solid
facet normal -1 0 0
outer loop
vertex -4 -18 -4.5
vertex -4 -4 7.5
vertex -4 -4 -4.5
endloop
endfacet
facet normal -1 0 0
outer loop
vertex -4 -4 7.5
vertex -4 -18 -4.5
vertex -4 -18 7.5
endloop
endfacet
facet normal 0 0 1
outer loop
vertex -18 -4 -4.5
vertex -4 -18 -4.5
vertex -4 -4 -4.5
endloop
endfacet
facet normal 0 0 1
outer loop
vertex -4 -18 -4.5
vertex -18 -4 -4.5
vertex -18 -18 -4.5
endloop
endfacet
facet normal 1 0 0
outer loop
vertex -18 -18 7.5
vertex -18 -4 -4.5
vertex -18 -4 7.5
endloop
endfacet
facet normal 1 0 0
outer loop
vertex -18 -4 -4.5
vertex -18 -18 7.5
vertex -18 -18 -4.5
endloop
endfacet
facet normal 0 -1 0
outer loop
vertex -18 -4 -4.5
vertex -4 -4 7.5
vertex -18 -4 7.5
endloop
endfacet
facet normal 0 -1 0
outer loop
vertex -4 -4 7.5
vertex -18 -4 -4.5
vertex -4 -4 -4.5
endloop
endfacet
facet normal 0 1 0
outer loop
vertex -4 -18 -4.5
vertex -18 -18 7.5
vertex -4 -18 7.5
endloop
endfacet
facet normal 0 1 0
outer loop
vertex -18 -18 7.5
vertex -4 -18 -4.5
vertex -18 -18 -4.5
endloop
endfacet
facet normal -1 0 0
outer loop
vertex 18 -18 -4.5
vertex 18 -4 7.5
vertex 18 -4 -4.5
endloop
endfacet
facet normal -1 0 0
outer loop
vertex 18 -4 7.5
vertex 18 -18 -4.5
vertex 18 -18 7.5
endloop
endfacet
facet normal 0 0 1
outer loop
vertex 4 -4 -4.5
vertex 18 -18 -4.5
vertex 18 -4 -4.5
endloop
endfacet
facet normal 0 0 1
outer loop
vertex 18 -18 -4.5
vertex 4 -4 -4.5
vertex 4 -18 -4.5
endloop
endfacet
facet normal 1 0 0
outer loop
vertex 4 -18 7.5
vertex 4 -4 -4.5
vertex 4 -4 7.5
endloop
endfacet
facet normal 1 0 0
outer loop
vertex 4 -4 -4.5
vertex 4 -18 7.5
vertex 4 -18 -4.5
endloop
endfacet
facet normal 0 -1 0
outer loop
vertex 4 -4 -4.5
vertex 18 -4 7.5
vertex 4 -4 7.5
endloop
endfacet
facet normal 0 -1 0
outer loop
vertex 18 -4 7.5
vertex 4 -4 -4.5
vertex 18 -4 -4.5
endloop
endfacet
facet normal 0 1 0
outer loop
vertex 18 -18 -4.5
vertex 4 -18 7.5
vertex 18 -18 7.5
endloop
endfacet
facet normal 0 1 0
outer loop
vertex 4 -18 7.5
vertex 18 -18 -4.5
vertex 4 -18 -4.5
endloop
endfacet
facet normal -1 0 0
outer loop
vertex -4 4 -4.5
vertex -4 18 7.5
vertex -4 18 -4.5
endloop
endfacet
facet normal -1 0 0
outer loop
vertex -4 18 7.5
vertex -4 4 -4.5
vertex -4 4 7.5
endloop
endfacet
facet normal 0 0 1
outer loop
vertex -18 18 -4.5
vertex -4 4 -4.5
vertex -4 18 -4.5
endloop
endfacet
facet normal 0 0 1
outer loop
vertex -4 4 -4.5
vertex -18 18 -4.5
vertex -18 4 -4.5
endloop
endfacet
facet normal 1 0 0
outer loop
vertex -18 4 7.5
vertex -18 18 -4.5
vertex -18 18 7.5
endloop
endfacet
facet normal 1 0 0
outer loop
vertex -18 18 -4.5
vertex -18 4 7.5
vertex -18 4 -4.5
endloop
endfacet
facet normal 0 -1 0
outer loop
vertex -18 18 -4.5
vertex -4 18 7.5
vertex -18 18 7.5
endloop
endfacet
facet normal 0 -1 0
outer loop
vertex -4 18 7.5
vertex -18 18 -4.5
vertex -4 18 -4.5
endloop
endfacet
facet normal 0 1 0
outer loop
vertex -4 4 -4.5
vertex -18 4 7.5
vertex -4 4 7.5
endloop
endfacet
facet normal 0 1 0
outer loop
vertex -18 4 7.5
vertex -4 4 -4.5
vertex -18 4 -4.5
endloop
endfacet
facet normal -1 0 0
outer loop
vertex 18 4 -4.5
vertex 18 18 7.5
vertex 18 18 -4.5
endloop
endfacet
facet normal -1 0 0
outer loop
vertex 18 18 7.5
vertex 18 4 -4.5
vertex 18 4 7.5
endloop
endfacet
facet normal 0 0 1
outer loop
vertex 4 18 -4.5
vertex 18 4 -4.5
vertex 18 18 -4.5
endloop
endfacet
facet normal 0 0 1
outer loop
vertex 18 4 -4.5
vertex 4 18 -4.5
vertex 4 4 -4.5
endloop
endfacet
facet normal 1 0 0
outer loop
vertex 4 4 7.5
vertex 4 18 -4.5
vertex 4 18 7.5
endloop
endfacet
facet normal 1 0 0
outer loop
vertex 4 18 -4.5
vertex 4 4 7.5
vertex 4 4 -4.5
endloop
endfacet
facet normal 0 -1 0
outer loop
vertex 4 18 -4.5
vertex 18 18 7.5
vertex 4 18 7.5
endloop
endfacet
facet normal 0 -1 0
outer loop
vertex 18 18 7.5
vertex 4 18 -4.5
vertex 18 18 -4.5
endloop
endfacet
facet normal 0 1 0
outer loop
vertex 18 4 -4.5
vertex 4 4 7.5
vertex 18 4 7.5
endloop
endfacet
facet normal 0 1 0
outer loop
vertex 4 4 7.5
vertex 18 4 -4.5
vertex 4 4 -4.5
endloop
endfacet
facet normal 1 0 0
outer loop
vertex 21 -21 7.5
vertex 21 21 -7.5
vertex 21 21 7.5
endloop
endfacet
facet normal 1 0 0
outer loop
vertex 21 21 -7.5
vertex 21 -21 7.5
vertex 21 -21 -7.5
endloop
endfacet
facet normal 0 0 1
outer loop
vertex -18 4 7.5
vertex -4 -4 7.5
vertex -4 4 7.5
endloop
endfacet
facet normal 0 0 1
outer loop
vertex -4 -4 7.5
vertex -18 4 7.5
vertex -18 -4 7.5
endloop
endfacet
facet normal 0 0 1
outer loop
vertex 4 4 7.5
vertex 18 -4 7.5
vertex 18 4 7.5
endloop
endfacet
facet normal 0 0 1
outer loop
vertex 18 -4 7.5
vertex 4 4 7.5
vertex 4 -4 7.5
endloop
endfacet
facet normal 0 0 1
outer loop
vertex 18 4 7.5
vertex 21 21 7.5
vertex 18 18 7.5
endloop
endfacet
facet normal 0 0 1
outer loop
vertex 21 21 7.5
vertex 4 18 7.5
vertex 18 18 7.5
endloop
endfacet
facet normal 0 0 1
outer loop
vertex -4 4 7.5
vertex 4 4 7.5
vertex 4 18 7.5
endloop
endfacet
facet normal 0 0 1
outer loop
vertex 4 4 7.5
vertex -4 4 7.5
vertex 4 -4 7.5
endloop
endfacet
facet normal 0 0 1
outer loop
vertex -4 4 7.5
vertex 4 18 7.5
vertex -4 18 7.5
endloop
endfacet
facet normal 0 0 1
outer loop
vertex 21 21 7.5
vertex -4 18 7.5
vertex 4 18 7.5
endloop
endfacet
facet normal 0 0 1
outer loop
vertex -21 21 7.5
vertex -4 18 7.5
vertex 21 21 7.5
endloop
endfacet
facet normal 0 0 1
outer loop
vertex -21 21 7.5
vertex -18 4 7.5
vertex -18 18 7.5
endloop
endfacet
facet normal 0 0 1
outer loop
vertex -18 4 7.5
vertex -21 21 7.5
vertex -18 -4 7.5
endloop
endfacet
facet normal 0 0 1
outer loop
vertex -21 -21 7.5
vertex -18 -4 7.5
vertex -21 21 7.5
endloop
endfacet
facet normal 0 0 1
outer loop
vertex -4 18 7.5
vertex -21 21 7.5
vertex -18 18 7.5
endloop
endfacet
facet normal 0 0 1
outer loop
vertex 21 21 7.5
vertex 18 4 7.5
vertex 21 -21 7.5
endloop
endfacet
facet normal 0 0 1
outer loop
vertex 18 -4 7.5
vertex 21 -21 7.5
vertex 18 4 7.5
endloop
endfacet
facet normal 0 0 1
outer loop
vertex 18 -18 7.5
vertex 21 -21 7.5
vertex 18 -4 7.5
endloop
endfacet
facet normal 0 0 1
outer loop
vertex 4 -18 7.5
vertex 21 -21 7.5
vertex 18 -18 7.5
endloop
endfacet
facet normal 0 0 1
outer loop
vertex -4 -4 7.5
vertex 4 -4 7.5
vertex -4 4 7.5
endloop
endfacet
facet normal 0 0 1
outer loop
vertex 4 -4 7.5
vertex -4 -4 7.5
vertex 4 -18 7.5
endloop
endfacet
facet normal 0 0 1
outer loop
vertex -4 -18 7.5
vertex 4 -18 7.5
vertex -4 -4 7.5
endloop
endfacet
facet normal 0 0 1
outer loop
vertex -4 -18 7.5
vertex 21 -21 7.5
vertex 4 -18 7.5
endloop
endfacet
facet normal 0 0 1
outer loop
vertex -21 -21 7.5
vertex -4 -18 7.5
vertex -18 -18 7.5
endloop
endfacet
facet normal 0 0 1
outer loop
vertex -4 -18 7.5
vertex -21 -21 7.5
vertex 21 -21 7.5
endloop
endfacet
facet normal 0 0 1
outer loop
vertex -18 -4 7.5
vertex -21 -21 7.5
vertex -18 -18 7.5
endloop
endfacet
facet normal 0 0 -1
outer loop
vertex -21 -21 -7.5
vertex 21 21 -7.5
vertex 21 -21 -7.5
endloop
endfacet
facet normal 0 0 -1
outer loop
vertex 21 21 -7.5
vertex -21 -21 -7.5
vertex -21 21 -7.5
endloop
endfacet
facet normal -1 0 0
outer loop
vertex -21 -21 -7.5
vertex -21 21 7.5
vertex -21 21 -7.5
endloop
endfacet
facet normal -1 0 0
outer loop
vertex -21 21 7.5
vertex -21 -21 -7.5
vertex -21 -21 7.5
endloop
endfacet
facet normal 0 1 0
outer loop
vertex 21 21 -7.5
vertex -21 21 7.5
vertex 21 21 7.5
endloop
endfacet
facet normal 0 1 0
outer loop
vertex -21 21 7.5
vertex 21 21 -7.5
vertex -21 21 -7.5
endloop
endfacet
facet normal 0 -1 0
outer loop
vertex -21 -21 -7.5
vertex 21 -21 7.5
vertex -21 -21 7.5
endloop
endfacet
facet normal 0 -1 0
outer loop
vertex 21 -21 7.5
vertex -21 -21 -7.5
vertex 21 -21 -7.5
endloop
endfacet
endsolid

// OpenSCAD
$fn = 32;

// ----------------------------------------------------------------------
// Pocket plate 42 x 42 x 15
// 2 x 2 pockets 14 mm square, 12 mm deep
// ----------------------------------------------------------------------

// --- parameters (mm) ---
thickness = 15;  // plate thickness
floor_t = 3;     // material left under each pocket
pocket = 14;     // pocket side length
pitch_x = 22;    // pocket pitch along X
pitch_y = 22;    // pocket pitch along Y
cols = 2;        // pockets per row
rows = 2;        // rows of pockets

// --- derived feature positions (mm) ---
depth = thickness - floor_t;        // = 12   pocket depth, down to the floor
span_x = (cols - 1) * pitch_x;      // = 22   distance between outer pockets
span_y = (rows - 1) * pitch_y;      // = 22   distance between outer pocket rows
origin_x = -span_x / 2;             // = -11   X of the first pocket
origin_y = -span_y / 2;             // = -11   Y of the first pocket
plate = [span_x + pocket + 6, span_y + pocket + 6, thickness];  // = [42, 42, 15]   overall size: pockets plus 3 mm of wall on each side
feature_centers = [
  [origin_x + 0 * pitch_x, origin_y + 0 * pitch_y],
  [origin_x + 1 * pitch_x, origin_y + 0 * pitch_y],
  [origin_x + 0 * pitch_x, origin_y + 1 * pitch_y],
  [origin_x + 1 * pitch_x, origin_y + 1 * pitch_y]
];   // pocket centres, used verbatim by the cutter loop

// plate outline, then one pocket per centre in feature_centers
difference() {
  cube(plate, center = true);
  for (centre = feature_centers)
    translate([centre[0] - pocket / 2, centre[1] - pocket / 2, plate[2] / 2 - depth])
      cube([pocket, pocket, depth + 1]);  // centred on the declared pocket centre
}
